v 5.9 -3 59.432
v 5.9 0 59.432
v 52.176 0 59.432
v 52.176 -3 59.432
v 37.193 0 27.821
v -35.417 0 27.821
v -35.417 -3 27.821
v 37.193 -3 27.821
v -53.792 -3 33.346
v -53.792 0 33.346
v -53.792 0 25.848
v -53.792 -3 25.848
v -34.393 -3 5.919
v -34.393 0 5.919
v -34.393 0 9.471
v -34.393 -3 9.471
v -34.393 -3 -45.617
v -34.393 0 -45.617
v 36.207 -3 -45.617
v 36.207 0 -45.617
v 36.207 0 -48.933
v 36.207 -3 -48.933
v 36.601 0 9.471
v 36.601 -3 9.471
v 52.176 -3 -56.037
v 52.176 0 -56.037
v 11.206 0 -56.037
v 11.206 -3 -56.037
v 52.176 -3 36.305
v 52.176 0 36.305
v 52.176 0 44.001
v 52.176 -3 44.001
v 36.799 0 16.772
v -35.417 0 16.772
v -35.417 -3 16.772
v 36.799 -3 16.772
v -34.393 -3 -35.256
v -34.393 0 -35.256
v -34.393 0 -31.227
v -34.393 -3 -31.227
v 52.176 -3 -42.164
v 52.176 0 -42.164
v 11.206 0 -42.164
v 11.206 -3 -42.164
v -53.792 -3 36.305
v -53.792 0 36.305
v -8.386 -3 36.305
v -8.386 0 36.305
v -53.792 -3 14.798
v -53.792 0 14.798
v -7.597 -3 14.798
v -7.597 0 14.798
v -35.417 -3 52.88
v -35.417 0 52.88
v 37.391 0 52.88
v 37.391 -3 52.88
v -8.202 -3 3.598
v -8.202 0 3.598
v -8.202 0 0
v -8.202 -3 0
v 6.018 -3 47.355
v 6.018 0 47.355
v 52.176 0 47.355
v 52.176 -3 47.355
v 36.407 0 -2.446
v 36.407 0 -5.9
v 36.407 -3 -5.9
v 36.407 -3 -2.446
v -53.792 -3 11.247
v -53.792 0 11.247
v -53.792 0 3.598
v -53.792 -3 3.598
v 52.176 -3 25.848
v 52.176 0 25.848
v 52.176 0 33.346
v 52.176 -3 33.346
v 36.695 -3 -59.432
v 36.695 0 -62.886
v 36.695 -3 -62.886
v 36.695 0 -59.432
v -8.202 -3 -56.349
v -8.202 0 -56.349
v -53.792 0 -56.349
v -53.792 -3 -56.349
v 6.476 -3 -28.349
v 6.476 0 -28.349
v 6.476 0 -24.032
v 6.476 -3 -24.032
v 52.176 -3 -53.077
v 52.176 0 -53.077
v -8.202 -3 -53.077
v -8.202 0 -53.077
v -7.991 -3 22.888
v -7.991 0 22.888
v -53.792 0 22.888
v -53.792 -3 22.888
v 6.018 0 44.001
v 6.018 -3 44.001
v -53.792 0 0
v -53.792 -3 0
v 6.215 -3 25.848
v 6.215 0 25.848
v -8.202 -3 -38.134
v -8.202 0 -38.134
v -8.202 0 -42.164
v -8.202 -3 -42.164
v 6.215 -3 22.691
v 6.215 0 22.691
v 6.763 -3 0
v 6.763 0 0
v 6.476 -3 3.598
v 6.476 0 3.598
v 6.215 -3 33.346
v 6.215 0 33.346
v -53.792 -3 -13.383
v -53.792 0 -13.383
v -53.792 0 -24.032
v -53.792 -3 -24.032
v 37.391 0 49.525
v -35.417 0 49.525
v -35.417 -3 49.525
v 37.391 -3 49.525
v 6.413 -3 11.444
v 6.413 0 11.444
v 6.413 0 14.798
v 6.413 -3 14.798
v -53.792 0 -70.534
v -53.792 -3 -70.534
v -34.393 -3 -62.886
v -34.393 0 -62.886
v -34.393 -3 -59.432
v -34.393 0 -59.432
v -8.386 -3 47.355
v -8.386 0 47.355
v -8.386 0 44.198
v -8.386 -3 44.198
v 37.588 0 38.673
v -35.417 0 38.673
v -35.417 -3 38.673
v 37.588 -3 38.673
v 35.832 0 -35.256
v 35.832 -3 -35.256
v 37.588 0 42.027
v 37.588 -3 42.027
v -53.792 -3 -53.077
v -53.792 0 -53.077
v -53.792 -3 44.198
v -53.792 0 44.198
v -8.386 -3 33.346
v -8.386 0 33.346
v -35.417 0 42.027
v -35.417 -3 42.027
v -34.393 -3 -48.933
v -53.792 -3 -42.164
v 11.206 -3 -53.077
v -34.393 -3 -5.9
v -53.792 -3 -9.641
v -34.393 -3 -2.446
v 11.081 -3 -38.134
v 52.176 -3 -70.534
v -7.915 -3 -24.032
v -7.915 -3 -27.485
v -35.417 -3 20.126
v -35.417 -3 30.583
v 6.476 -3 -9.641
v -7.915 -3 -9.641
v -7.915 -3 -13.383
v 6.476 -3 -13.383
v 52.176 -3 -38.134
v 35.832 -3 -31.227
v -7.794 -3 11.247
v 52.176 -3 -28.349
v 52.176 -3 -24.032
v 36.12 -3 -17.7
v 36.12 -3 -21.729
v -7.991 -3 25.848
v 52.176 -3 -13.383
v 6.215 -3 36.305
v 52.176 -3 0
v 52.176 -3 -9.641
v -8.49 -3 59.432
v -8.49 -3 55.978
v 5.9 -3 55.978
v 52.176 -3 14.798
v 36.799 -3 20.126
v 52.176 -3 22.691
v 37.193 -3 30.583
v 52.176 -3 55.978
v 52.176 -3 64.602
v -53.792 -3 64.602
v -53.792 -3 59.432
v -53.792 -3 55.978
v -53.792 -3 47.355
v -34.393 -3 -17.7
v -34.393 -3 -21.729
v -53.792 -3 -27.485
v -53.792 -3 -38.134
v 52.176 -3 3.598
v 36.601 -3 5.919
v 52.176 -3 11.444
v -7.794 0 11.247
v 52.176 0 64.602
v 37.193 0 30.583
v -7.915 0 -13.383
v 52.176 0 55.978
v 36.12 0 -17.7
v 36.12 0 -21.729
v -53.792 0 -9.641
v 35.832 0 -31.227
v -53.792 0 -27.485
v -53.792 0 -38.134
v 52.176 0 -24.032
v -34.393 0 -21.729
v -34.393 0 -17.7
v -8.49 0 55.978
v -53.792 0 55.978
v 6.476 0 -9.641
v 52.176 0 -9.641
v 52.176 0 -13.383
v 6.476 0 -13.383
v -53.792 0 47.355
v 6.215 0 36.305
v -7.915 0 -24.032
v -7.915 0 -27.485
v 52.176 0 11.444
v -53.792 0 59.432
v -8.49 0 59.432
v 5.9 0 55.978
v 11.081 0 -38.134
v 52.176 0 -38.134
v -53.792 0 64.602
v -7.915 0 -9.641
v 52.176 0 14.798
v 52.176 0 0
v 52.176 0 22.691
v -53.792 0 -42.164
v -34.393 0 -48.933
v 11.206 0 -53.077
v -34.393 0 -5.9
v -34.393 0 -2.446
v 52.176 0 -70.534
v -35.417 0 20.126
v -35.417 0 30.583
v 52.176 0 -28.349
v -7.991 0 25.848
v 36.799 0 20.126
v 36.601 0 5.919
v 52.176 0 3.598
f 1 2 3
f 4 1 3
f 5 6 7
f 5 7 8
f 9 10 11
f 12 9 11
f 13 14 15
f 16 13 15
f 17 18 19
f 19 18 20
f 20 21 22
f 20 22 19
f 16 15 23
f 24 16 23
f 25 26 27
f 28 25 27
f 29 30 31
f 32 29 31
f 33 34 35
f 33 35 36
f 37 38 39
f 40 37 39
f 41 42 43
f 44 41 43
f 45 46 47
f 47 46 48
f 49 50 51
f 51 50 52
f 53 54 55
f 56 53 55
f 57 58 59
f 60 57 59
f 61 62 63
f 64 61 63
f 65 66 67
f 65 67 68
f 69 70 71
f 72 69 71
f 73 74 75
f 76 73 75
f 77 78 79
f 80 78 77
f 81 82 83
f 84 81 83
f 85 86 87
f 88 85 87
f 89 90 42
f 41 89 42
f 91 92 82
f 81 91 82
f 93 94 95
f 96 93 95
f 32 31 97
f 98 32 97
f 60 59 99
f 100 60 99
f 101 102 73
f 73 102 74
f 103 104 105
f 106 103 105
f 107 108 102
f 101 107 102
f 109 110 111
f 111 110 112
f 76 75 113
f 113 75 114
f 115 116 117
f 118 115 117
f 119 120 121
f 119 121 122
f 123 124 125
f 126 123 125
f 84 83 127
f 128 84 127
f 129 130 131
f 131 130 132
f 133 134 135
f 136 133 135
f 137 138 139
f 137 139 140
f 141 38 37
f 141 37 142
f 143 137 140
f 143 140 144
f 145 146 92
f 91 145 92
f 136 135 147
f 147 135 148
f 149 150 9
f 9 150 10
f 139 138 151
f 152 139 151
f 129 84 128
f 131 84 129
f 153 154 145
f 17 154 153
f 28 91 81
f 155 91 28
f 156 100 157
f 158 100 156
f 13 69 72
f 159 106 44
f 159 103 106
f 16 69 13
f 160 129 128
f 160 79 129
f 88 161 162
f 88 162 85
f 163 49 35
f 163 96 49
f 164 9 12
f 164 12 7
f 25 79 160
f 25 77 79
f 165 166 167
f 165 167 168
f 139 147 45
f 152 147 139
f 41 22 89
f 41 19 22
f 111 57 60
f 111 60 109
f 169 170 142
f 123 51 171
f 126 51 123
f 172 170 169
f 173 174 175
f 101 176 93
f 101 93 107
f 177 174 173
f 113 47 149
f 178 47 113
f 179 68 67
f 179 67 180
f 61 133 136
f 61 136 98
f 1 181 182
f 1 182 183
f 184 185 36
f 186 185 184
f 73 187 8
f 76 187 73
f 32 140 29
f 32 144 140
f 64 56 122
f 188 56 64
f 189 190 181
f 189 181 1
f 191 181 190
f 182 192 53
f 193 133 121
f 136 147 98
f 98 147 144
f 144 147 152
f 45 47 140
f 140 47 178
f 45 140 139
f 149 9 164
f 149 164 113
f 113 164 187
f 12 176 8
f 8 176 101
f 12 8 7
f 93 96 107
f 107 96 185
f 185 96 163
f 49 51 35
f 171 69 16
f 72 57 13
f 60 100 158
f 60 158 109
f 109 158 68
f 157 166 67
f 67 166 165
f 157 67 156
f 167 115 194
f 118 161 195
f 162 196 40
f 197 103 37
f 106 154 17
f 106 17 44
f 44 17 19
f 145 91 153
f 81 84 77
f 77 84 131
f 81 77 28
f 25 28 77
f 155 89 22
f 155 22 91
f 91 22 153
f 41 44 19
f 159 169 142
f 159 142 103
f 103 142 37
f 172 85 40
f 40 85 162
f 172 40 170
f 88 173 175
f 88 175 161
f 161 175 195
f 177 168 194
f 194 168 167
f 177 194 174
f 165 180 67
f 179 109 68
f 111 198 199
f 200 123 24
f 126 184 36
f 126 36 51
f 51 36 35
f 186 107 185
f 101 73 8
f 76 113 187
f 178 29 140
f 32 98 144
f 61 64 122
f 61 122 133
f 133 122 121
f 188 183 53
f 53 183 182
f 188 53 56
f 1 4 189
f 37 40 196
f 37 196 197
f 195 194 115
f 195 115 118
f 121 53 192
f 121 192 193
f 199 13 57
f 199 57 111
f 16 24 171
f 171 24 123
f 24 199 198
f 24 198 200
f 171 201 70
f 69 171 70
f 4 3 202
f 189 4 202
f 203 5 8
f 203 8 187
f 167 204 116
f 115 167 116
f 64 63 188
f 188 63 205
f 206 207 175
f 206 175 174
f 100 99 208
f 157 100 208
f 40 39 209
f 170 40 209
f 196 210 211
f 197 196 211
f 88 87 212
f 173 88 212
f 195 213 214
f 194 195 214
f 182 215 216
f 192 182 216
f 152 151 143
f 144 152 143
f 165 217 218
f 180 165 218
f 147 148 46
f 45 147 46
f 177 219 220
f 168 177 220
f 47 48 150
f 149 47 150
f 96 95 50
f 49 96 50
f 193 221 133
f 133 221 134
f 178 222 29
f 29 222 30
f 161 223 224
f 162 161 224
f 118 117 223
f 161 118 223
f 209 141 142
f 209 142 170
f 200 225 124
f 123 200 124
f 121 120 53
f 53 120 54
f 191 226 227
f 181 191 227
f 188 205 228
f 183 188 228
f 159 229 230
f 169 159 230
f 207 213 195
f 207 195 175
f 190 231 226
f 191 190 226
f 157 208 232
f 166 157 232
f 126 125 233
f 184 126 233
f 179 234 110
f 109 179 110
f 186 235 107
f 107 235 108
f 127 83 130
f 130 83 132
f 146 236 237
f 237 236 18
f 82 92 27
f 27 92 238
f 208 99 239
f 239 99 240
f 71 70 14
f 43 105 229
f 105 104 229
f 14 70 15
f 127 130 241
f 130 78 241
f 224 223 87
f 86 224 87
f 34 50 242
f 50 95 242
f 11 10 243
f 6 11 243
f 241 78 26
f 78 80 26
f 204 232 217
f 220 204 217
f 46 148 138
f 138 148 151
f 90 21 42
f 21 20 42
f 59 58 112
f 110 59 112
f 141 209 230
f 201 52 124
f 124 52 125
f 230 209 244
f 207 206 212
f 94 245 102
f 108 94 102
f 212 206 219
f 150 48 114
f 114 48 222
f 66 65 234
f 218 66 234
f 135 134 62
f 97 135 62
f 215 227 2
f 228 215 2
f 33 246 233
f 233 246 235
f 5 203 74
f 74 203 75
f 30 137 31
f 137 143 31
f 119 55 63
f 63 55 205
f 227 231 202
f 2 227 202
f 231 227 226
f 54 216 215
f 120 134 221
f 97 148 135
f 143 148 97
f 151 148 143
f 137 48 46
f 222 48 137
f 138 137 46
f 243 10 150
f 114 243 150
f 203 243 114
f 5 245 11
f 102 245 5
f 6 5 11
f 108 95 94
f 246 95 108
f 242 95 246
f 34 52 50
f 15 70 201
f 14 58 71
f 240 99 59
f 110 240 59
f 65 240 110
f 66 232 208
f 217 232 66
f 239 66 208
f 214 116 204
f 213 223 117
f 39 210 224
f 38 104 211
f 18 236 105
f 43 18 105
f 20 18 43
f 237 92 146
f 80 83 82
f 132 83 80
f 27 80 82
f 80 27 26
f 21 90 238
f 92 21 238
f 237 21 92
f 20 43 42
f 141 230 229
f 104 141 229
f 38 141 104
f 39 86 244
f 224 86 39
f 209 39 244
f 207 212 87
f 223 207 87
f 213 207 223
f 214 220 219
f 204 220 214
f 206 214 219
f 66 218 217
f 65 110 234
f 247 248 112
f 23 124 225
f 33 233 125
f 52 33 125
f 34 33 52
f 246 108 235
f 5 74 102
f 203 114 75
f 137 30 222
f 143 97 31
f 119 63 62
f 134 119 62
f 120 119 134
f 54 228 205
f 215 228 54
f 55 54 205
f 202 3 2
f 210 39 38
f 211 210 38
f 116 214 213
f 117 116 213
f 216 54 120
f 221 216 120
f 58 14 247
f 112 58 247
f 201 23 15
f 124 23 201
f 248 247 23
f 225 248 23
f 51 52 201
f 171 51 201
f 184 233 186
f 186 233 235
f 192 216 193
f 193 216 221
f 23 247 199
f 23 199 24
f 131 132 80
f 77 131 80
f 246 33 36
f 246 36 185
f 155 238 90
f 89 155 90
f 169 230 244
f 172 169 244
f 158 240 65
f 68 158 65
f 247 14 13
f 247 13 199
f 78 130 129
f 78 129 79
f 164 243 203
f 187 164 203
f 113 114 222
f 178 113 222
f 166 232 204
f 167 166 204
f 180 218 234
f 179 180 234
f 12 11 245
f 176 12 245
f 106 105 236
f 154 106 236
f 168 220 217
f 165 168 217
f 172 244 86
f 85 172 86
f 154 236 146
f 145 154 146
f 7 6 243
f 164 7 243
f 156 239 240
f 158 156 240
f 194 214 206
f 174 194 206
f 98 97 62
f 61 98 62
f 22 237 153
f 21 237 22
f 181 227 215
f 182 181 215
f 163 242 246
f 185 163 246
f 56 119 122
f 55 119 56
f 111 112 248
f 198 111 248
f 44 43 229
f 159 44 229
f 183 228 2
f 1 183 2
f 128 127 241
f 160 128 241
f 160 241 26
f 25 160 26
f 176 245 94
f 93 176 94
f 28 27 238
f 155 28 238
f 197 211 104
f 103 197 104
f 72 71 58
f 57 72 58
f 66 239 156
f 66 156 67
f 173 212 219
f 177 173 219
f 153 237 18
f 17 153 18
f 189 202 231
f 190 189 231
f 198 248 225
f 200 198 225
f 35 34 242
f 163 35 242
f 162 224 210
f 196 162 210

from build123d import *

# Parameters (mm, degrees)
F0_W     = 71.088023
F0_H     = 3.453668
F0_W_2   = 70.599534
F0_H_2   = 3.316156
F0_W_3   = 70.224609
F0_H_3   = 4.029283
F0_W_4   = 70.512414
F0_H_4   = 4.029279
F0_W_5   = 70.800219
F0_H_5   = 3.453669
F0_W_6   = 70.994157
F0_H_6   = 3.551615
F0_W_7   = 72.216179
F0_H_7   = 3.354305
F0_W_8   = 72.610803
F0_H_8   = 2.762366
F0_W_9   = 73.005423
F0_H_9   = 3.354303
F0_W_10  = 72.808113
F0_H_10  = 3.354299
F1_DEPTH = 3


with BuildPart() as f1:
    # F0 (on Front) → F1 (new body)
    with BuildSketch(Plane.XZ):
        Polygon((52.176289, 64.601567), (-53.791832, 64.601567), (-53.791832, 59.431892), (-8.49027, 59.431892), (-8.49027, 55.97822), (-53.791832, 55.97822), (-53.791832, 47.354873), (-8.385758, 47.354873), (-8.385758, 44.197883), (-53.791832, 44.197883), (-53.791832, 36.305401), (-8.385758, 36.305401), (-8.385758, 33.345722), (-53.791832, 33.345722), (-53.791832, 25.847867), (-7.991134, 25.847867), (-7.991134, 22.888189), (-53.791832, 22.888189), (-53.791832, 14.798397), (-7.596511, 14.798397), (-7.793822, 11.246782), (-53.791832, 11.246782), (-53.791832, 3.597572), (-8.202464, 3.597572), (-8.202464, 0), (-53.791832, 0), (-53.791832, -9.641493), (-7.914659, -9.641493), (-7.914659, -13.382968), (-53.791832, -13.382968), (-53.791832, -24.031783), (-7.914659, -24.031783), (-7.914659, -27.485449), (-53.791832, -27.485449), (-53.791832, -38.134262), (-8.202464, -38.134262), (-8.202464, -42.163543), (-53.791832, -42.163543), (-53.791832, -53.076919), (-8.202464, -53.076919), (-8.202464, -56.348752), (-53.791832, -56.348752), (-53.791832, -70.533961), (52.176289, -70.533961), (52.176289, -56.036595), (11.206436, -56.036595), (11.206436, -53.076919), (52.176289, -53.076919), (52.176289, -42.163543), (11.206436, -42.163543), (11.080521, -38.134262), (52.176289, -38.134262), (52.176289, -28.348867), (6.475631, -28.348867), (6.475631, -24.031783), (52.176289, -24.031783), (52.176289, -13.382968), (6.475631, -13.382968), (6.475631, -9.641493), (52.176289, -9.641493), (52.176289, 0), (6.763437, 0), (6.475631, 3.597572), (52.176289, 3.597572), (52.176289, 11.444095), (6.412639, 11.444095), (6.412639, 14.798397), (52.176289, 14.798397), (52.176289, 22.690875), (6.215328, 22.690875), (6.215328, 25.847867), (52.176289, 25.847867), (52.176289, 33.345722), (6.215328, 33.345722), (6.215328, 36.305401), (52.176289, 36.305401), (52.176289, 44.000566), (6.018014, 44.000566), (6.018014, 47.354873), (52.176289, 47.354873), (52.176289, 55.97822), (5.900018, 55.97822), (5.900018, 59.431892), (52.176289, 59.431892), align=None)
        with Locations((1.151222, -61.158726)):
            Rectangle(F0_W, F0_H, mode=Mode.SUBTRACT)
        with Locations((0.906978, -47.27529)):
            Rectangle(F0_W_2, F0_H_2, mode=Mode.SUBTRACT)
        with Locations((0.719515, -33.241566)):
            Rectangle(F0_W_3, F0_H_3, mode=Mode.SUBTRACT)
        with Locations((0.863418, -19.714693)):
            Rectangle(F0_W_4, F0_H_4, mode=Mode.SUBTRACT)
        with Locations((1.00732, -4.173183)):
            Rectangle(F0_W_5, F0_H_5, mode=Mode.SUBTRACT)
        with Locations((1.10429, 7.695167)):
            Rectangle(F0_W_6, F0_H_6, mode=Mode.SUBTRACT)
        with Locations((0.690593, 18.448668)):
            Rectangle(F0_W_7, F0_H_7, mode=Mode.SUBTRACT)
        with Locations((0.887905, 29.202171)):
            Rectangle(F0_W_8, F0_H_8, mode=Mode.SUBTRACT)
        with Locations((1.085214, 40.350296)):
            Rectangle(F0_W_9, F0_H_9, mode=Mode.SUBTRACT)
        with Locations((0.98656, 51.202455)):
            Rectangle(F0_W_10, F0_H_10, mode=Mode.SUBTRACT)
    extrude(amount=F1_DEPTH)


solid = f1.part
